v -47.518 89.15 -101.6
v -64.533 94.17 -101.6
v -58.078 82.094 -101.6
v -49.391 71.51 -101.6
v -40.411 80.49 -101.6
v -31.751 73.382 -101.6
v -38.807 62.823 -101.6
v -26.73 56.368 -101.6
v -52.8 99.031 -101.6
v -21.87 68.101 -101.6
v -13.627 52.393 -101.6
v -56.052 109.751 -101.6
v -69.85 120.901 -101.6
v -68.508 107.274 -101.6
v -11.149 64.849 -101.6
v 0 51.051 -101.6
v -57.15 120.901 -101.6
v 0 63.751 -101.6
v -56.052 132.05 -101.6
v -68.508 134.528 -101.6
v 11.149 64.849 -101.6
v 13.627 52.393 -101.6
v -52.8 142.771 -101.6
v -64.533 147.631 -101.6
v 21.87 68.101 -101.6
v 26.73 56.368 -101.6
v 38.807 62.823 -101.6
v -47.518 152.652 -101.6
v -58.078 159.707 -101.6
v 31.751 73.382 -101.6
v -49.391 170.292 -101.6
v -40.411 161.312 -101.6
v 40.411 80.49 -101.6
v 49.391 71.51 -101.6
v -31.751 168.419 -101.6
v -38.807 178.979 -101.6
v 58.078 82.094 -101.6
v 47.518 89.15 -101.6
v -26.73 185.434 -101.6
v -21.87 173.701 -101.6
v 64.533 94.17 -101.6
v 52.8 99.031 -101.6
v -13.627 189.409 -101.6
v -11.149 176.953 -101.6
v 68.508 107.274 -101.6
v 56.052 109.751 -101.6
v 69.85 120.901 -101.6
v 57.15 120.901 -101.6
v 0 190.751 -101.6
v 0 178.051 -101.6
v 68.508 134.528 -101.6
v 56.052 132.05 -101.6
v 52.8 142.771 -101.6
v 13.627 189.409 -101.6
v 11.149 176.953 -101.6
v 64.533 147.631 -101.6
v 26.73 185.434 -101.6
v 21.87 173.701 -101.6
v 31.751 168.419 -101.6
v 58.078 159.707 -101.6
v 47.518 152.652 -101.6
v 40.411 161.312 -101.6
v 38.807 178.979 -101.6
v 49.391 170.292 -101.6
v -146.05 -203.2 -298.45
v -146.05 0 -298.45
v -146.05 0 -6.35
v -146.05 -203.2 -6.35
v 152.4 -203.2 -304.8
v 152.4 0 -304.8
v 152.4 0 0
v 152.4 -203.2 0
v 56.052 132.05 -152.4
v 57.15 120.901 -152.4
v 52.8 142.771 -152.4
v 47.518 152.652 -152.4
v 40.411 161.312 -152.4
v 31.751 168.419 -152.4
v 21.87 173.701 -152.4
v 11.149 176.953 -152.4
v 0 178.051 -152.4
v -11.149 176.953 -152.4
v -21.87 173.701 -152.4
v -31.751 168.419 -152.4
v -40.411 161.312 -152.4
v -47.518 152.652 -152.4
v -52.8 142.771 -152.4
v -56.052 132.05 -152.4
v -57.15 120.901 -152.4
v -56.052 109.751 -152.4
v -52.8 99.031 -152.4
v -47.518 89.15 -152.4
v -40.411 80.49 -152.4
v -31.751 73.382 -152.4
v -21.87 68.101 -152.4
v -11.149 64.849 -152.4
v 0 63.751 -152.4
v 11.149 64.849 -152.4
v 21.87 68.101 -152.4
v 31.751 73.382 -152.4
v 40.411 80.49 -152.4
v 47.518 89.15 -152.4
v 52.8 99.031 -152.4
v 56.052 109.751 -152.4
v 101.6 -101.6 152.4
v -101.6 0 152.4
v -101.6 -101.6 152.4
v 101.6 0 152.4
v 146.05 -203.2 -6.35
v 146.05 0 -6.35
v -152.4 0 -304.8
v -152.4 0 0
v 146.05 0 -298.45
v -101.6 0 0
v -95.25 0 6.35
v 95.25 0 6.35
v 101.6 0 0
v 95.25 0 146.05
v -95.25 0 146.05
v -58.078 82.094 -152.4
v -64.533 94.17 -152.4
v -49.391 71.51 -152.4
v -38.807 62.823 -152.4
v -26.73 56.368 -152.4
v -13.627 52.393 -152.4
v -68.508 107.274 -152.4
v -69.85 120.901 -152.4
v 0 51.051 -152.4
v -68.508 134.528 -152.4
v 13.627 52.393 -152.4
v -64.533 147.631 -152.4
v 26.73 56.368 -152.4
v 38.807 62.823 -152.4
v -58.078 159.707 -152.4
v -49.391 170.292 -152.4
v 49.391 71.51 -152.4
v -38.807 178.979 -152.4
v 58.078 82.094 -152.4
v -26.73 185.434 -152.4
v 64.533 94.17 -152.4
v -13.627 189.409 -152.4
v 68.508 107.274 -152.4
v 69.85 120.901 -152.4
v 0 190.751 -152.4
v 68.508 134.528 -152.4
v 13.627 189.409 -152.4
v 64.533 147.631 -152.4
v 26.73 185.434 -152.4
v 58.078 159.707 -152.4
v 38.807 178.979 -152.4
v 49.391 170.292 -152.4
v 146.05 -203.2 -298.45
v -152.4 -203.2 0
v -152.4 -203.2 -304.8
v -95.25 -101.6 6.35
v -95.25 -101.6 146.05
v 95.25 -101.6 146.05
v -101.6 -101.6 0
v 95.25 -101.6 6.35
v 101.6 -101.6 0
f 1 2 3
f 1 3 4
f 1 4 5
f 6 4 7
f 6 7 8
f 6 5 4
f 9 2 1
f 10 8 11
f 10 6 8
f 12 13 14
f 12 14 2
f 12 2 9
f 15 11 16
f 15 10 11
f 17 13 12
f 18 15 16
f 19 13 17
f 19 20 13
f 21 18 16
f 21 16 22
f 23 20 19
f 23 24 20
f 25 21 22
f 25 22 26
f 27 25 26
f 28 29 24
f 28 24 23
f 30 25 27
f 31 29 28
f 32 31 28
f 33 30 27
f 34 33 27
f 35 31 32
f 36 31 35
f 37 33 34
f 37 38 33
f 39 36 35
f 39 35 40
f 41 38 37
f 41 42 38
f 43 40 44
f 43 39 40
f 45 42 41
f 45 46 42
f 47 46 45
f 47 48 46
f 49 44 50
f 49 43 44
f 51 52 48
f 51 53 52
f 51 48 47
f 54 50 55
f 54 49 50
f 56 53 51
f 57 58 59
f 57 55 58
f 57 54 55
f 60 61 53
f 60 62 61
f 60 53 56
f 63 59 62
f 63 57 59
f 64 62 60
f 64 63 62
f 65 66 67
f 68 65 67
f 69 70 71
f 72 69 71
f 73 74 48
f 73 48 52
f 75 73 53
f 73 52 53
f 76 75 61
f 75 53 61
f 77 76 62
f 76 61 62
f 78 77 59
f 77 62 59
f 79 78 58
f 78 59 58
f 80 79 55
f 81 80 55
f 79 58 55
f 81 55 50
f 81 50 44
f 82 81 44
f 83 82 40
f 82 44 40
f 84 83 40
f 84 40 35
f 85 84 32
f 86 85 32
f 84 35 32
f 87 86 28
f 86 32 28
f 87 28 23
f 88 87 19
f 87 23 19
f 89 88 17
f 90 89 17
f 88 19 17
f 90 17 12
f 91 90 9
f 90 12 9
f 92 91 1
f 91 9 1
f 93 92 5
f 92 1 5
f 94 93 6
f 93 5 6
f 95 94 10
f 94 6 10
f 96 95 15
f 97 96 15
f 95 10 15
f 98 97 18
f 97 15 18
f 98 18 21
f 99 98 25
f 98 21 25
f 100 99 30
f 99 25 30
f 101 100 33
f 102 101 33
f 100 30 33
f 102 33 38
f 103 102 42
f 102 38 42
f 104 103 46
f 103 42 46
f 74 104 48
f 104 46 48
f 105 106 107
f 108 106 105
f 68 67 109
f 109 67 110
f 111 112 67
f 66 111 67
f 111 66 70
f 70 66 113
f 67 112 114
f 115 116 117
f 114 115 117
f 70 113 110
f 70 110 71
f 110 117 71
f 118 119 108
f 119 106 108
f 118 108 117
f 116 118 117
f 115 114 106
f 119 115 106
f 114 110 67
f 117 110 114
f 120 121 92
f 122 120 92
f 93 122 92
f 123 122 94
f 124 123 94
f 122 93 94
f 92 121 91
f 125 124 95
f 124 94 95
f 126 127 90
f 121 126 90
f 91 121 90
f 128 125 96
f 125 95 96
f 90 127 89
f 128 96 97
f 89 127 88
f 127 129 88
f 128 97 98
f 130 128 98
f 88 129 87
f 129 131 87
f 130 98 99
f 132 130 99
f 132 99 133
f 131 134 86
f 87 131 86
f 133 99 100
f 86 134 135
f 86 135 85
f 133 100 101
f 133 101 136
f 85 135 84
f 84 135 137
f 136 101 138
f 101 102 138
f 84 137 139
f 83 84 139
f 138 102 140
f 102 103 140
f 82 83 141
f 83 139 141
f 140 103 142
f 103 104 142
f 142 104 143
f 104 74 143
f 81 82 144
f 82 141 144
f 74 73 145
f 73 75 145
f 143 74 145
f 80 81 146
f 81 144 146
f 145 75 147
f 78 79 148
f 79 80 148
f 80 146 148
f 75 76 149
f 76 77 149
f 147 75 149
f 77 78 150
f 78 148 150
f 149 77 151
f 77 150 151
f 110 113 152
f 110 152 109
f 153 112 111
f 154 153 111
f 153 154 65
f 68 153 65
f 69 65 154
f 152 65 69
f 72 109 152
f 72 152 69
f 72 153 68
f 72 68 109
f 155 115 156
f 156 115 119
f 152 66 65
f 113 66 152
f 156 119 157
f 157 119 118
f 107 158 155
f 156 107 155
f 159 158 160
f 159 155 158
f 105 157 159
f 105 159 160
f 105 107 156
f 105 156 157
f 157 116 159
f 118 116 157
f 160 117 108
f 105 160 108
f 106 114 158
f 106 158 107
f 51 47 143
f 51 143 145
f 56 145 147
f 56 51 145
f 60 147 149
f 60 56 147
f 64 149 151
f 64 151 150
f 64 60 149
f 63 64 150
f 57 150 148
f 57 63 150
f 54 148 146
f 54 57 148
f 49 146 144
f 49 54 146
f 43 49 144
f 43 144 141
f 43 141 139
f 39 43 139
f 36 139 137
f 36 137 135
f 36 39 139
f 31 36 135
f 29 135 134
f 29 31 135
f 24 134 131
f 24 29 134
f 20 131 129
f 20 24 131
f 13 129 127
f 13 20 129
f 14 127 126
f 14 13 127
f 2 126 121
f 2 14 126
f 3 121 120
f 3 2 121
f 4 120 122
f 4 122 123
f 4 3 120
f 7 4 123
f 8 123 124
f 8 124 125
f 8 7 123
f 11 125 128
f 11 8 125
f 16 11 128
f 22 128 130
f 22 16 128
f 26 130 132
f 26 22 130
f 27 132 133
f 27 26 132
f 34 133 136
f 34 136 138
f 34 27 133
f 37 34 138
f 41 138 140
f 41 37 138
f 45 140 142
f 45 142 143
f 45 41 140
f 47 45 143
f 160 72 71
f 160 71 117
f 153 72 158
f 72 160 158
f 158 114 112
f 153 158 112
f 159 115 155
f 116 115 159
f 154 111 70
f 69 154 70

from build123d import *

# Parameters (mm, degrees)
F0_W     = 203.2
F0_H     = 152.4
F0_W_2   = 190.5
F0_H_2   = 139.7
F1_DEPTH = 101.6
F0_W_3   = 292.1
F0_H_3   = 292.1
F2_DEPTH = 203.2
F4_R     = 69.85
F4_R_2   = 57.15
F5_DEPTH = 50.8


with BuildPart() as f1:
    # F0 (on Front) → F1 (new body)
    with BuildSketch(Plane.XZ):
        with Locations((0, 76.2)):
            Rectangle(F0_W, F0_H)
        with Locations((0, 76.2)):
            Rectangle(F0_W_2, F0_H_2, mode=Mode.SUBTRACT)
    extrude(amount=F1_DEPTH)

    # F0 (on Front) → F2 (join)
    with BuildSketch(Plane.XZ):
        Polygon((101.6, 0), (-101.6, 0), (-152.4, 0), (-152.4, -304.8), (152.4, -304.8), (152.4, 0), align=None)
        with Locations((0, -152.4)):
            Rectangle(F0_W_3, F0_H_3, mode=Mode.SUBTRACT)
    extrude(amount=F2_DEPTH)


with BuildPart() as f5:
    # F4 (on offset) → F5 (new body)
    with BuildSketch(Plane.XY.offset(-101.6)):
        with Locations((0, 120.9009091642)):
            Circle(F4_R)
        with Locations((0, 120.9009091642)):
            Circle(F4_R_2, mode=Mode.SUBTRACT)
    extrude(amount=-F5_DEPTH)


solid = Compound([f1.part, f5.part])
